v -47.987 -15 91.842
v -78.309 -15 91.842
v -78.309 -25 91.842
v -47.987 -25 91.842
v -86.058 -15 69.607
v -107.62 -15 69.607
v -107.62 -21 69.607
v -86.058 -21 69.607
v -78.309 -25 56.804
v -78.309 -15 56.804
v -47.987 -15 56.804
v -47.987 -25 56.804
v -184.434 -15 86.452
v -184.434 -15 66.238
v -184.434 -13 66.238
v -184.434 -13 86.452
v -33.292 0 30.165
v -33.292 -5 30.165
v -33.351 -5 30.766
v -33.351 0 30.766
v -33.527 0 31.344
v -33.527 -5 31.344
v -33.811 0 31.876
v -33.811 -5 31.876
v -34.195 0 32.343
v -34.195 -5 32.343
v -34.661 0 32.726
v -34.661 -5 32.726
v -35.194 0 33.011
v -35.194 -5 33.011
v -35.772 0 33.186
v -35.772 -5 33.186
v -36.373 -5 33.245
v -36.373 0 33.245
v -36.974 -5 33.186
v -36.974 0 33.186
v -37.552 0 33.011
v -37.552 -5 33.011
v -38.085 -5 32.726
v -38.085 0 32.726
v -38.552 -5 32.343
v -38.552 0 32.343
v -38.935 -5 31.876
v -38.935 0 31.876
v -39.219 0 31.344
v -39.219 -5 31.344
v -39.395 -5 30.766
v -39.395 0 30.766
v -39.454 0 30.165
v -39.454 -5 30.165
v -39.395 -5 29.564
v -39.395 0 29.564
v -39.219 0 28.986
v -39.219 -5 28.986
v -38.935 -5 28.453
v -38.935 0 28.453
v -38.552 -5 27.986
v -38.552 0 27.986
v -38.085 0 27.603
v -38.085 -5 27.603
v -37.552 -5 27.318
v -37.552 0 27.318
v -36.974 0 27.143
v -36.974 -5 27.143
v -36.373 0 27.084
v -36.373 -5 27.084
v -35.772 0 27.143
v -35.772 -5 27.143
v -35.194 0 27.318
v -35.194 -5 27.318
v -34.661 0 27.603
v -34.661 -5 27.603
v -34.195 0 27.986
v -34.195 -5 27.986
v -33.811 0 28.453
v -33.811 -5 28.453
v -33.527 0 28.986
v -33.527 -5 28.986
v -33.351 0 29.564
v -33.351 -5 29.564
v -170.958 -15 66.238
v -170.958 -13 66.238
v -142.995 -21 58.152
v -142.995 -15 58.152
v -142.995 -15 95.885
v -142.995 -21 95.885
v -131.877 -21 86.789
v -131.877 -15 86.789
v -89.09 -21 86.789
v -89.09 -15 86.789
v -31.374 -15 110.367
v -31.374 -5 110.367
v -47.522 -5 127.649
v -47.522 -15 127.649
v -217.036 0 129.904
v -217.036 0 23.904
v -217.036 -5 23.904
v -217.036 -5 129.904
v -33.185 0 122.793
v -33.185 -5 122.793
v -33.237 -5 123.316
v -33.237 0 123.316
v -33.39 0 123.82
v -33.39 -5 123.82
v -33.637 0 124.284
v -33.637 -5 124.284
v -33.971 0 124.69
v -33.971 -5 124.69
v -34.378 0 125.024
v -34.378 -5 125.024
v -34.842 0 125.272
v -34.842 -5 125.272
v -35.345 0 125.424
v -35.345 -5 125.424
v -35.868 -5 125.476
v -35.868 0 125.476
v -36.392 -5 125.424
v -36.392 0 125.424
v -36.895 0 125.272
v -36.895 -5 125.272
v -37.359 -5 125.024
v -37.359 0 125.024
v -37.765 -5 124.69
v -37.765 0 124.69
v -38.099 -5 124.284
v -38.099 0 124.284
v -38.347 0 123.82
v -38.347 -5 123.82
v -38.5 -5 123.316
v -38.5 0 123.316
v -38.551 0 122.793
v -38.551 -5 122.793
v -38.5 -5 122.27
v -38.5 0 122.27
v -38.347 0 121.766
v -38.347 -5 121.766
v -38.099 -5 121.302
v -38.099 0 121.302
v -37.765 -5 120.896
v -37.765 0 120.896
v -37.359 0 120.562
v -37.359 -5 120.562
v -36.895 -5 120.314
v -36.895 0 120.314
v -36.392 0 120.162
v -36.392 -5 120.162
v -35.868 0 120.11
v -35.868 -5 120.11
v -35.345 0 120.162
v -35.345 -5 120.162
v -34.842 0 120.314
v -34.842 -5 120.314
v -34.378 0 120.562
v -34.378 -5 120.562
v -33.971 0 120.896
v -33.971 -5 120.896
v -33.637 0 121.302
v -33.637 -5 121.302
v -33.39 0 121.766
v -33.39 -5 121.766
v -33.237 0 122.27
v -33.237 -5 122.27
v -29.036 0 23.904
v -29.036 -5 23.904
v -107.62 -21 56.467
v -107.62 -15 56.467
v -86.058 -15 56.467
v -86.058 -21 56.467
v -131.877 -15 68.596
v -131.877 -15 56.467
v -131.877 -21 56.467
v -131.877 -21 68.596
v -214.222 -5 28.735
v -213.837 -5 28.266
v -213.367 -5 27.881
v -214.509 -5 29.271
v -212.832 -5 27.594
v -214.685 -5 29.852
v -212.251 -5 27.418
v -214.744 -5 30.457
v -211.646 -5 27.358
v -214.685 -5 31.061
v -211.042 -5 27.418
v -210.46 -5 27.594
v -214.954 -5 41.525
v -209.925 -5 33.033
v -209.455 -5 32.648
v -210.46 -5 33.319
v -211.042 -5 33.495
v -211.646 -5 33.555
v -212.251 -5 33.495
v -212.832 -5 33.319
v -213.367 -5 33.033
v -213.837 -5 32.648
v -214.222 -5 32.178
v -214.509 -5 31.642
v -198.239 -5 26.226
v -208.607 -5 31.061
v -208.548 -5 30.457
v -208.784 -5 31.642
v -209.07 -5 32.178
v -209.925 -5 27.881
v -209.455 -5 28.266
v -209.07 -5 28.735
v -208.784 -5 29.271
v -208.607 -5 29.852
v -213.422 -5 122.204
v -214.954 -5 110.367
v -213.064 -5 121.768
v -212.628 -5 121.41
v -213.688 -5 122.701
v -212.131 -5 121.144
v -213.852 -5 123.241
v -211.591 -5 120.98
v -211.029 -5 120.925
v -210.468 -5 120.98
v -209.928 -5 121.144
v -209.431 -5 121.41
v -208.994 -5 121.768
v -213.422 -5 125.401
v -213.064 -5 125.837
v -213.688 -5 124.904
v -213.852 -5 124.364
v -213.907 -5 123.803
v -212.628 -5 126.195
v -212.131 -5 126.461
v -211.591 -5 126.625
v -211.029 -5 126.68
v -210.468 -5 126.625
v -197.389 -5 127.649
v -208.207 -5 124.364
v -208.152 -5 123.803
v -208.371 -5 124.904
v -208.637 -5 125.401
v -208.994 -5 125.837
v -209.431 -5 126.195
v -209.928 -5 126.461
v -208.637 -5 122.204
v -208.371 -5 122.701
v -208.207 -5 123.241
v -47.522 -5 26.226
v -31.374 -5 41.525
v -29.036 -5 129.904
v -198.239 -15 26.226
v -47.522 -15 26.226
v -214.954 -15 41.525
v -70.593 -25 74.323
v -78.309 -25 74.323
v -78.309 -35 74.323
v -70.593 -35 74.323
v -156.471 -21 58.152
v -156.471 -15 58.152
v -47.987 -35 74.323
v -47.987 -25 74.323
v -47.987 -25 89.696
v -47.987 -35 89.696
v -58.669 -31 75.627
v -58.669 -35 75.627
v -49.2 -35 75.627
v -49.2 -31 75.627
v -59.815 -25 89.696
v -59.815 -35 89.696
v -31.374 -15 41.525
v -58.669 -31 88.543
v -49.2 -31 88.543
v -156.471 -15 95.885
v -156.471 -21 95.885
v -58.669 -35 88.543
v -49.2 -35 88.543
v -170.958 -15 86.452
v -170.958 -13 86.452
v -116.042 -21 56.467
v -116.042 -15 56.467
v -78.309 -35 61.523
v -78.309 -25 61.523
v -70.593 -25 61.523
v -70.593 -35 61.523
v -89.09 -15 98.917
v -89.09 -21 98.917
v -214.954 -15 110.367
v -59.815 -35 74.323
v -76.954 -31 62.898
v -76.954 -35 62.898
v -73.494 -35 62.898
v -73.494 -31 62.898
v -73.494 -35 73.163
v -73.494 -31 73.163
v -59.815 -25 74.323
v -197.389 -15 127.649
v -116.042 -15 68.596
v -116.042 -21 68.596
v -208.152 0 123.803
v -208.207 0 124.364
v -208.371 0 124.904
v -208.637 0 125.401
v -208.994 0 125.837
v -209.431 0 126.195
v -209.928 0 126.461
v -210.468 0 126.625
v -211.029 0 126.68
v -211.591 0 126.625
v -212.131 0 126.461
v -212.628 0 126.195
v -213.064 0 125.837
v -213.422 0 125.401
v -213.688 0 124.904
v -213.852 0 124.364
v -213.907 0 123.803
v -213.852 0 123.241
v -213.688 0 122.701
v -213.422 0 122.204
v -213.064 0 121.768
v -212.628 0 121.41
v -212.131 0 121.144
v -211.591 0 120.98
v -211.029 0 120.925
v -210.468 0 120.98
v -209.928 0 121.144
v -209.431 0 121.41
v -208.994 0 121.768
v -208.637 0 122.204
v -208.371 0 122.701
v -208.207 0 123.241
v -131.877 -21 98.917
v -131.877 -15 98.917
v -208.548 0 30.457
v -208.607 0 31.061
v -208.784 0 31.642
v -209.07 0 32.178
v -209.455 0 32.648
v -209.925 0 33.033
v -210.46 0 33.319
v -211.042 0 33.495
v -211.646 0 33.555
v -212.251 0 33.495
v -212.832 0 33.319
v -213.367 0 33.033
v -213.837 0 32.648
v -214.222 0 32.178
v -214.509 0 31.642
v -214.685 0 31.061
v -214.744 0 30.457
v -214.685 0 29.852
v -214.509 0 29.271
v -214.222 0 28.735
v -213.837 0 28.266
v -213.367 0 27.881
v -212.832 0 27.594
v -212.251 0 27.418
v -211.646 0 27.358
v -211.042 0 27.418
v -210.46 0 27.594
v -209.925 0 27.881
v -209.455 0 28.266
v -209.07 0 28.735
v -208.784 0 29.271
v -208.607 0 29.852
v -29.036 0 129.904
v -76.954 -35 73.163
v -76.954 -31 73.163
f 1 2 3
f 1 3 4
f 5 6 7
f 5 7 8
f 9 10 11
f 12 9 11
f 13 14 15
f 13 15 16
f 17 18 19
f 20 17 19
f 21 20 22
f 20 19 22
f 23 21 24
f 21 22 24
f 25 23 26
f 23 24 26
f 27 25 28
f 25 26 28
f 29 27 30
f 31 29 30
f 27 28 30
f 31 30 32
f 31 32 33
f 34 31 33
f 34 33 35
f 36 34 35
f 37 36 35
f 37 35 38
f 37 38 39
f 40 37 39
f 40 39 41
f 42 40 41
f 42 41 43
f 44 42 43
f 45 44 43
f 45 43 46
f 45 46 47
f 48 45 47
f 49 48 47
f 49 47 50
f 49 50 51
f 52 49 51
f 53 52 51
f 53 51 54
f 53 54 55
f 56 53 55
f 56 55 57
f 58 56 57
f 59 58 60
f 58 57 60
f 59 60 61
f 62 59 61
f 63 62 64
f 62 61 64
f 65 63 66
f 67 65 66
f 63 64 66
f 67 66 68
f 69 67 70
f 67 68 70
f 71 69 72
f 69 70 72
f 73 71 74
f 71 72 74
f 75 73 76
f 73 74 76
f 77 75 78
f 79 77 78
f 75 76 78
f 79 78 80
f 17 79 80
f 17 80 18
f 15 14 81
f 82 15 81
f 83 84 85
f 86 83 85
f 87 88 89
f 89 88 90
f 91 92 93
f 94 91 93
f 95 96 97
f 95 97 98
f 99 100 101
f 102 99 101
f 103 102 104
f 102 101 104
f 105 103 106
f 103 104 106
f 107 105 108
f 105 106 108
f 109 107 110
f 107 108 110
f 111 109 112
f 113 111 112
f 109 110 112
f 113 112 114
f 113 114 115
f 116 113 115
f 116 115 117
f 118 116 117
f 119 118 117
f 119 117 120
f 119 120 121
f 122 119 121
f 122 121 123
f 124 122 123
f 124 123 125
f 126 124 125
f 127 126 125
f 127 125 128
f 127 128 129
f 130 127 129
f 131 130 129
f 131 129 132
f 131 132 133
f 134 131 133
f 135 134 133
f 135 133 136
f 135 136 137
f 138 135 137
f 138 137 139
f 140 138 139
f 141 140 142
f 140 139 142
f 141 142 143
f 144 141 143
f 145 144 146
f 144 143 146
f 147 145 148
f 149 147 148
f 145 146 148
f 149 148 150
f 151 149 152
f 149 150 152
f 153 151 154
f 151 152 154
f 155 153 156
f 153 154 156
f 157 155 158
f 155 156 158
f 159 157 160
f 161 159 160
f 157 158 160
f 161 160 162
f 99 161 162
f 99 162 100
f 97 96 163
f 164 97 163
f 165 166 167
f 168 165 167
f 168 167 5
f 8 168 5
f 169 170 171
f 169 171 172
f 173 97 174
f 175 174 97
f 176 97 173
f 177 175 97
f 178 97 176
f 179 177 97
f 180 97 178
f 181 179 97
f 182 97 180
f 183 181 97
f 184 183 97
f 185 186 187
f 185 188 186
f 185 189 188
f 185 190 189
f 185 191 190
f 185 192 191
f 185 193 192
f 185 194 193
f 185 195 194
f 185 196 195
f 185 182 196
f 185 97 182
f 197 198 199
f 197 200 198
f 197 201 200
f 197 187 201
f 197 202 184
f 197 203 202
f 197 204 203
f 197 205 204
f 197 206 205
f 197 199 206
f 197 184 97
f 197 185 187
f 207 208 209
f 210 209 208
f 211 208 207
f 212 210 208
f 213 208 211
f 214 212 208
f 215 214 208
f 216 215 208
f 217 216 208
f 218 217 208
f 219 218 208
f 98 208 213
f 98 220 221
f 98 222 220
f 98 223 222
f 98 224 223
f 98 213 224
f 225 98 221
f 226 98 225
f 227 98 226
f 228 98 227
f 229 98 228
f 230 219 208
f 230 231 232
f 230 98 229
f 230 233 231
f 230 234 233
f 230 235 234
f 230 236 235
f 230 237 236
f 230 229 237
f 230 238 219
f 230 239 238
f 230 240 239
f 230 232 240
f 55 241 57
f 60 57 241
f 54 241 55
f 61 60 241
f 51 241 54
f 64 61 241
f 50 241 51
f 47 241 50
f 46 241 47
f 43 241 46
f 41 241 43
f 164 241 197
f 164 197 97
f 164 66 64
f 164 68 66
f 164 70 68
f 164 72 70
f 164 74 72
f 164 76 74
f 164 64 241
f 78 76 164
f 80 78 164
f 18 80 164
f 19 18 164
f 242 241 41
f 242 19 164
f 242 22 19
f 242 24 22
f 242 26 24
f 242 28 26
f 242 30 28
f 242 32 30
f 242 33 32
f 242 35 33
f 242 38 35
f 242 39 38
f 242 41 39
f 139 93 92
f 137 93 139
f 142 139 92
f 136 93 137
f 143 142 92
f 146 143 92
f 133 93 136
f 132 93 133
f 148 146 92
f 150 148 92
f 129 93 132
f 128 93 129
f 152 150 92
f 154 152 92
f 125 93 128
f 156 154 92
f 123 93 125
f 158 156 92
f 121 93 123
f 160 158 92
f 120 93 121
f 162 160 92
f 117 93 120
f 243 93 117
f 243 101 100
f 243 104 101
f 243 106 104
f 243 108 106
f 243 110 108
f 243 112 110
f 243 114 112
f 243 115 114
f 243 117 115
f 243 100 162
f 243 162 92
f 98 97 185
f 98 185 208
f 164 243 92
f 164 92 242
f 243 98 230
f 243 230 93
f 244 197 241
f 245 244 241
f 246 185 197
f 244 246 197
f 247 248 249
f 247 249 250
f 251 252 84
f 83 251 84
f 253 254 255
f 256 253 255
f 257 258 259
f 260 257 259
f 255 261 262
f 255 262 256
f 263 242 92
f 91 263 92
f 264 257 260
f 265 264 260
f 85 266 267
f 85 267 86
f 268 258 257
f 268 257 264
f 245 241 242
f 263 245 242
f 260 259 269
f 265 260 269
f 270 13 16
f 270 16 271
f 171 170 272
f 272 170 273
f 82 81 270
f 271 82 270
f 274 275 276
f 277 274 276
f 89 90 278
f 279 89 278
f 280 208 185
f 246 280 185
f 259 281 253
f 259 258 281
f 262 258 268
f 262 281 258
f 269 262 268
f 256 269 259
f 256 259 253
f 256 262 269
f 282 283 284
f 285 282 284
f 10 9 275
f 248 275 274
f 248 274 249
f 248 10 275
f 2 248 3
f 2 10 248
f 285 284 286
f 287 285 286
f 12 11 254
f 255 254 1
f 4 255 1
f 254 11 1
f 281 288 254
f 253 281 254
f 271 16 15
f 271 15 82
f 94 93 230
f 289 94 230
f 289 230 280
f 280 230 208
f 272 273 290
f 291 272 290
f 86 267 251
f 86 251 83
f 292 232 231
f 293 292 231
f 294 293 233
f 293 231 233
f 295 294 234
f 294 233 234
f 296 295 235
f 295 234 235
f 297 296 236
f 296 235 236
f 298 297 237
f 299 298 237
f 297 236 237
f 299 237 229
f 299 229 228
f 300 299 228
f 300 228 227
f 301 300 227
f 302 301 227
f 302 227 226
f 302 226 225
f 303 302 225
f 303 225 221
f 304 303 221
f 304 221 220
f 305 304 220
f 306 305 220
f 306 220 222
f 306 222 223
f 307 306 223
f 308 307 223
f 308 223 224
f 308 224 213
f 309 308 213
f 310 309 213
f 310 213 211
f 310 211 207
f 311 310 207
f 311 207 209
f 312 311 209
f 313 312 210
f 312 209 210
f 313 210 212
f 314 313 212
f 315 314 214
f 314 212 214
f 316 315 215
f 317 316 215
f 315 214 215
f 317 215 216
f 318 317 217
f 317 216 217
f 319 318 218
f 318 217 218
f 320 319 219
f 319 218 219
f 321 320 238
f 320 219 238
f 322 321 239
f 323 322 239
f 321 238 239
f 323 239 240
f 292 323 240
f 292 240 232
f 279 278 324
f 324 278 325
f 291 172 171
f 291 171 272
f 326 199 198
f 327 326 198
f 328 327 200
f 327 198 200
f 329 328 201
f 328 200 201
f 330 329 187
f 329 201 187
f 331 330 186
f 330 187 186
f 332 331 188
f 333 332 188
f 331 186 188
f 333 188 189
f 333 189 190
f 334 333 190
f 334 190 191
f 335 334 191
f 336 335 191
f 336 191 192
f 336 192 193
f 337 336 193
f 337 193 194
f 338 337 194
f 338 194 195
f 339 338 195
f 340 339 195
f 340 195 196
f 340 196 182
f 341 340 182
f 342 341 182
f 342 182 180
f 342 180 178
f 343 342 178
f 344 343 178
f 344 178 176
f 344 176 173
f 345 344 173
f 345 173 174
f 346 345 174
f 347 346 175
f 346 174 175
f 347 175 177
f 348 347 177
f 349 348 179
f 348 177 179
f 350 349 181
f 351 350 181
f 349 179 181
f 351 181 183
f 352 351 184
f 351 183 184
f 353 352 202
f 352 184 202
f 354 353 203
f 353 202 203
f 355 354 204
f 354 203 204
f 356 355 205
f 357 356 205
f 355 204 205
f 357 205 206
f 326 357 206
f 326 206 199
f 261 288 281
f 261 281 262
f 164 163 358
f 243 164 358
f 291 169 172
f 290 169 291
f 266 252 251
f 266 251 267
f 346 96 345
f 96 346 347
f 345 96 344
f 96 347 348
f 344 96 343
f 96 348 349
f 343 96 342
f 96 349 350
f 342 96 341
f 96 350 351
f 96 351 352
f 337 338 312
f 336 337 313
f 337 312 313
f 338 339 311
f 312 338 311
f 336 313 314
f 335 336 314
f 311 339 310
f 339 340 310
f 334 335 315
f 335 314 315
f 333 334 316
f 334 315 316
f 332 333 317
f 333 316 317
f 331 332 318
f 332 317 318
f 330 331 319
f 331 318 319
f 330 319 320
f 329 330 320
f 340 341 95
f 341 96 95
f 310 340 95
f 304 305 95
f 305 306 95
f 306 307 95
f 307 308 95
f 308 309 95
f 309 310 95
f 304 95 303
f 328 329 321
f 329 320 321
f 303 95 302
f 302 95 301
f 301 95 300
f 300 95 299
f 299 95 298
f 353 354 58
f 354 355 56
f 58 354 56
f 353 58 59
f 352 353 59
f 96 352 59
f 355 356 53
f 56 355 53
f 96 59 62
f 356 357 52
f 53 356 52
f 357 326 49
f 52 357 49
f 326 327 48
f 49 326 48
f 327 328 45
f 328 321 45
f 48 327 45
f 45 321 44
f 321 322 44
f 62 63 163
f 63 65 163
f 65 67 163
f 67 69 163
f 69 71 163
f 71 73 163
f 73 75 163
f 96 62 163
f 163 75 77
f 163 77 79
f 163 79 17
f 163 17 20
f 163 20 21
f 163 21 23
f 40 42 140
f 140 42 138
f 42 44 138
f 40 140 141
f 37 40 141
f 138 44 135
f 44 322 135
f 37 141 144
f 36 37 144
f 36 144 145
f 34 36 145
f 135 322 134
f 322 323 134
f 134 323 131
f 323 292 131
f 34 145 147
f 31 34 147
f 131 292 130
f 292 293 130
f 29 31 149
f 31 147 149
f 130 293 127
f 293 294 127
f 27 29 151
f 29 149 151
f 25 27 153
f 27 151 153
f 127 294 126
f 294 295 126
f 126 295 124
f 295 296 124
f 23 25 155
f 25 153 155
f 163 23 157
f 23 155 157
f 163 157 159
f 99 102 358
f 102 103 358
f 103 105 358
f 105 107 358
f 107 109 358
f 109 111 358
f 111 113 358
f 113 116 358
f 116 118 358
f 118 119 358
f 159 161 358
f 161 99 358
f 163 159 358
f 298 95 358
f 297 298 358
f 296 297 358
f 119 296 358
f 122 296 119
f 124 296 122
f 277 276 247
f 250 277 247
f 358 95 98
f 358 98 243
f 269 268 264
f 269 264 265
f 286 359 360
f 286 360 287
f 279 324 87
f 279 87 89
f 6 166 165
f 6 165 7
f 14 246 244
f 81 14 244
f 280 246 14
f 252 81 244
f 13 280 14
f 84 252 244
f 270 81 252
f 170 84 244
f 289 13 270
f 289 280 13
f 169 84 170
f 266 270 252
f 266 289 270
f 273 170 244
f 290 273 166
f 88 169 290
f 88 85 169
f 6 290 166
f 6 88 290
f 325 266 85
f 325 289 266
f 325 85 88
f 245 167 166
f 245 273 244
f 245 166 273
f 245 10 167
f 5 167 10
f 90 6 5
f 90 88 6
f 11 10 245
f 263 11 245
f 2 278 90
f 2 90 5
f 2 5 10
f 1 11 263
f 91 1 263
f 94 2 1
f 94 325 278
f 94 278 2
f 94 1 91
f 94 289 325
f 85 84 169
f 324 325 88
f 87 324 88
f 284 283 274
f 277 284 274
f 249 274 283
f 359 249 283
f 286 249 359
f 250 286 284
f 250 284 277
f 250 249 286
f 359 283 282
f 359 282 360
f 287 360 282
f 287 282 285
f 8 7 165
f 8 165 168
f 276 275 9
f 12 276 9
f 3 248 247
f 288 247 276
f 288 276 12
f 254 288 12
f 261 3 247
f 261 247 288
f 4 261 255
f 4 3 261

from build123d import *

# Parameters (mm, degrees)
F0_W      = 188
F0_H      = 106
F1_DEPTH  = 5
F3_DEPTH  = 10
F4_R      = 2.877723
F4_R_2    = 3.098338
F4_R_3    = 3.080854
F4_R_4    = 2.682981
F5_DEPTH  = 25
F6_W      = 13.476193
F6_H      = 20.214289
F7_DEPTH  = 2
F6_H_2    = 37.733339
F6_W_2    = 15.834533
F6_H_3    = 12.128577
F6_W_3    = 21.561905
F6_H_4    = 13.139285
F8_DEPTH  = 6
F6_W_4    = 30.321434
F6_H_5    = 35.038095
F9_DEPTH  = 10
F10_W     = 11.828035
F10_H     = 15.372609
F10_W_2   = 7.715762
F10_H_2   = 12.800521
F11_DEPTH = 10
F12_W     = 9.468928
F12_H     = 12.915805
F13_DEPTH = 4
F14_W     = 3.46078
F14_H     = 10.265284
F15_DEPTH = 4


with BuildPart() as f1:
    # F0 (on Front) → F1 (new body)
    with BuildSketch(Plane.XZ):
        with Locations((-123.036315, 76.903633)):
            Rectangle(F0_W, F0_H)
    extrude(amount=F1_DEPTH)

    # F2 (on face) → F3 (join)
    with BuildSketch(Plane.XZ.offset(5)):
        Polygon((-47.522057, 127.648577), (-197.388828, 127.648577), (-214.953557, 110.367149), (-214.953557, 41.52476), (-198.23873, 26.226448), (-47.522057, 26.226448), (-31.373844, 41.52476), (-31.373844, 110.367149), align=None)
    extrude(amount=F3_DEPTH)

    # F4 (on face) → F5 (cut)
    with BuildSketch(Plane.XZ.offset(5)):
        with Locations((-211.029306, 123.802513)):
            Circle(F4_R)
        with Locations((-211.646155, 30.456685)):
            Circle(F4_R_2)
        with Locations((-36.373071, 30.164568)):
            Circle(F4_R_3)
        with Locations((-35.86828, 122.792944)):
            Circle(F4_R_4)
    extrude(amount=-F5_DEPTH, mode=Mode.SUBTRACT)

    # F6 (on face) → F7 (cut)
    with BuildSketch(Plane.XZ.offset(15)):
        with Locations((-177.695751, 76.344832)):
            Rectangle(F6_W, F6_H)
    extrude(amount=-F7_DEPTH, mode=Mode.SUBTRACT)

    # F6 (on face) → F8 (join)
    with BuildSketch(Plane.XZ.offset(15)):
        with Locations((-149.732649, 77.018644)):
            Rectangle(F6_W, F6_H_2)
        Polygon((-124.801703, 98.917454), (-131.876707, 98.917454), (-131.876707, 94.53769), (-131.876707, 86.788885), (-89.089796, 86.788885), (-89.089796, 98.917454), align=None)
        with Locations((-123.95944, 62.53174)):
            Rectangle(F6_W_2, F6_H_3)
        with Locations((-96.838608, 63.037093)):
            Rectangle(F6_W_3, F6_H_4)
    extrude(amount=F8_DEPTH)

    # F6 (on face) → F9 (join)
    with BuildSketch(Plane.XZ.offset(15)):
        with Locations((-63.148126, 74.323403)):
            Rectangle(F6_W_4, F6_H_5)
    extrude(amount=F9_DEPTH)

    # F10 (on face) → F11 (join)
    with BuildSketch(Plane.XZ.offset(25)):
        with Locations((-53.901426, 82.009707)):
            Rectangle(F10_W, F10_H)
        with Locations((-74.450962, 67.923142)):
            Rectangle(F10_W_2, F10_H_2)
    extrude(amount=F11_DEPTH)

    # F12 (on face) → F13 (cut)
    with BuildSketch(Plane.XZ.offset(35)):
        with Locations((-53.934842, 82.085251)):
            Rectangle(F12_W, F12_H)
    extrude(amount=-F13_DEPTH, mode=Mode.SUBTRACT)

    # F14 (on face) → F15 (cut)
    with BuildSketch(Plane.XZ.offset(35)):
        with Locations((-75.223997, 68.030607)):
            Rectangle(F14_W, F14_H)
    extrude(amount=-F15_DEPTH, mode=Mode.SUBTRACT)


solid = f1.part
